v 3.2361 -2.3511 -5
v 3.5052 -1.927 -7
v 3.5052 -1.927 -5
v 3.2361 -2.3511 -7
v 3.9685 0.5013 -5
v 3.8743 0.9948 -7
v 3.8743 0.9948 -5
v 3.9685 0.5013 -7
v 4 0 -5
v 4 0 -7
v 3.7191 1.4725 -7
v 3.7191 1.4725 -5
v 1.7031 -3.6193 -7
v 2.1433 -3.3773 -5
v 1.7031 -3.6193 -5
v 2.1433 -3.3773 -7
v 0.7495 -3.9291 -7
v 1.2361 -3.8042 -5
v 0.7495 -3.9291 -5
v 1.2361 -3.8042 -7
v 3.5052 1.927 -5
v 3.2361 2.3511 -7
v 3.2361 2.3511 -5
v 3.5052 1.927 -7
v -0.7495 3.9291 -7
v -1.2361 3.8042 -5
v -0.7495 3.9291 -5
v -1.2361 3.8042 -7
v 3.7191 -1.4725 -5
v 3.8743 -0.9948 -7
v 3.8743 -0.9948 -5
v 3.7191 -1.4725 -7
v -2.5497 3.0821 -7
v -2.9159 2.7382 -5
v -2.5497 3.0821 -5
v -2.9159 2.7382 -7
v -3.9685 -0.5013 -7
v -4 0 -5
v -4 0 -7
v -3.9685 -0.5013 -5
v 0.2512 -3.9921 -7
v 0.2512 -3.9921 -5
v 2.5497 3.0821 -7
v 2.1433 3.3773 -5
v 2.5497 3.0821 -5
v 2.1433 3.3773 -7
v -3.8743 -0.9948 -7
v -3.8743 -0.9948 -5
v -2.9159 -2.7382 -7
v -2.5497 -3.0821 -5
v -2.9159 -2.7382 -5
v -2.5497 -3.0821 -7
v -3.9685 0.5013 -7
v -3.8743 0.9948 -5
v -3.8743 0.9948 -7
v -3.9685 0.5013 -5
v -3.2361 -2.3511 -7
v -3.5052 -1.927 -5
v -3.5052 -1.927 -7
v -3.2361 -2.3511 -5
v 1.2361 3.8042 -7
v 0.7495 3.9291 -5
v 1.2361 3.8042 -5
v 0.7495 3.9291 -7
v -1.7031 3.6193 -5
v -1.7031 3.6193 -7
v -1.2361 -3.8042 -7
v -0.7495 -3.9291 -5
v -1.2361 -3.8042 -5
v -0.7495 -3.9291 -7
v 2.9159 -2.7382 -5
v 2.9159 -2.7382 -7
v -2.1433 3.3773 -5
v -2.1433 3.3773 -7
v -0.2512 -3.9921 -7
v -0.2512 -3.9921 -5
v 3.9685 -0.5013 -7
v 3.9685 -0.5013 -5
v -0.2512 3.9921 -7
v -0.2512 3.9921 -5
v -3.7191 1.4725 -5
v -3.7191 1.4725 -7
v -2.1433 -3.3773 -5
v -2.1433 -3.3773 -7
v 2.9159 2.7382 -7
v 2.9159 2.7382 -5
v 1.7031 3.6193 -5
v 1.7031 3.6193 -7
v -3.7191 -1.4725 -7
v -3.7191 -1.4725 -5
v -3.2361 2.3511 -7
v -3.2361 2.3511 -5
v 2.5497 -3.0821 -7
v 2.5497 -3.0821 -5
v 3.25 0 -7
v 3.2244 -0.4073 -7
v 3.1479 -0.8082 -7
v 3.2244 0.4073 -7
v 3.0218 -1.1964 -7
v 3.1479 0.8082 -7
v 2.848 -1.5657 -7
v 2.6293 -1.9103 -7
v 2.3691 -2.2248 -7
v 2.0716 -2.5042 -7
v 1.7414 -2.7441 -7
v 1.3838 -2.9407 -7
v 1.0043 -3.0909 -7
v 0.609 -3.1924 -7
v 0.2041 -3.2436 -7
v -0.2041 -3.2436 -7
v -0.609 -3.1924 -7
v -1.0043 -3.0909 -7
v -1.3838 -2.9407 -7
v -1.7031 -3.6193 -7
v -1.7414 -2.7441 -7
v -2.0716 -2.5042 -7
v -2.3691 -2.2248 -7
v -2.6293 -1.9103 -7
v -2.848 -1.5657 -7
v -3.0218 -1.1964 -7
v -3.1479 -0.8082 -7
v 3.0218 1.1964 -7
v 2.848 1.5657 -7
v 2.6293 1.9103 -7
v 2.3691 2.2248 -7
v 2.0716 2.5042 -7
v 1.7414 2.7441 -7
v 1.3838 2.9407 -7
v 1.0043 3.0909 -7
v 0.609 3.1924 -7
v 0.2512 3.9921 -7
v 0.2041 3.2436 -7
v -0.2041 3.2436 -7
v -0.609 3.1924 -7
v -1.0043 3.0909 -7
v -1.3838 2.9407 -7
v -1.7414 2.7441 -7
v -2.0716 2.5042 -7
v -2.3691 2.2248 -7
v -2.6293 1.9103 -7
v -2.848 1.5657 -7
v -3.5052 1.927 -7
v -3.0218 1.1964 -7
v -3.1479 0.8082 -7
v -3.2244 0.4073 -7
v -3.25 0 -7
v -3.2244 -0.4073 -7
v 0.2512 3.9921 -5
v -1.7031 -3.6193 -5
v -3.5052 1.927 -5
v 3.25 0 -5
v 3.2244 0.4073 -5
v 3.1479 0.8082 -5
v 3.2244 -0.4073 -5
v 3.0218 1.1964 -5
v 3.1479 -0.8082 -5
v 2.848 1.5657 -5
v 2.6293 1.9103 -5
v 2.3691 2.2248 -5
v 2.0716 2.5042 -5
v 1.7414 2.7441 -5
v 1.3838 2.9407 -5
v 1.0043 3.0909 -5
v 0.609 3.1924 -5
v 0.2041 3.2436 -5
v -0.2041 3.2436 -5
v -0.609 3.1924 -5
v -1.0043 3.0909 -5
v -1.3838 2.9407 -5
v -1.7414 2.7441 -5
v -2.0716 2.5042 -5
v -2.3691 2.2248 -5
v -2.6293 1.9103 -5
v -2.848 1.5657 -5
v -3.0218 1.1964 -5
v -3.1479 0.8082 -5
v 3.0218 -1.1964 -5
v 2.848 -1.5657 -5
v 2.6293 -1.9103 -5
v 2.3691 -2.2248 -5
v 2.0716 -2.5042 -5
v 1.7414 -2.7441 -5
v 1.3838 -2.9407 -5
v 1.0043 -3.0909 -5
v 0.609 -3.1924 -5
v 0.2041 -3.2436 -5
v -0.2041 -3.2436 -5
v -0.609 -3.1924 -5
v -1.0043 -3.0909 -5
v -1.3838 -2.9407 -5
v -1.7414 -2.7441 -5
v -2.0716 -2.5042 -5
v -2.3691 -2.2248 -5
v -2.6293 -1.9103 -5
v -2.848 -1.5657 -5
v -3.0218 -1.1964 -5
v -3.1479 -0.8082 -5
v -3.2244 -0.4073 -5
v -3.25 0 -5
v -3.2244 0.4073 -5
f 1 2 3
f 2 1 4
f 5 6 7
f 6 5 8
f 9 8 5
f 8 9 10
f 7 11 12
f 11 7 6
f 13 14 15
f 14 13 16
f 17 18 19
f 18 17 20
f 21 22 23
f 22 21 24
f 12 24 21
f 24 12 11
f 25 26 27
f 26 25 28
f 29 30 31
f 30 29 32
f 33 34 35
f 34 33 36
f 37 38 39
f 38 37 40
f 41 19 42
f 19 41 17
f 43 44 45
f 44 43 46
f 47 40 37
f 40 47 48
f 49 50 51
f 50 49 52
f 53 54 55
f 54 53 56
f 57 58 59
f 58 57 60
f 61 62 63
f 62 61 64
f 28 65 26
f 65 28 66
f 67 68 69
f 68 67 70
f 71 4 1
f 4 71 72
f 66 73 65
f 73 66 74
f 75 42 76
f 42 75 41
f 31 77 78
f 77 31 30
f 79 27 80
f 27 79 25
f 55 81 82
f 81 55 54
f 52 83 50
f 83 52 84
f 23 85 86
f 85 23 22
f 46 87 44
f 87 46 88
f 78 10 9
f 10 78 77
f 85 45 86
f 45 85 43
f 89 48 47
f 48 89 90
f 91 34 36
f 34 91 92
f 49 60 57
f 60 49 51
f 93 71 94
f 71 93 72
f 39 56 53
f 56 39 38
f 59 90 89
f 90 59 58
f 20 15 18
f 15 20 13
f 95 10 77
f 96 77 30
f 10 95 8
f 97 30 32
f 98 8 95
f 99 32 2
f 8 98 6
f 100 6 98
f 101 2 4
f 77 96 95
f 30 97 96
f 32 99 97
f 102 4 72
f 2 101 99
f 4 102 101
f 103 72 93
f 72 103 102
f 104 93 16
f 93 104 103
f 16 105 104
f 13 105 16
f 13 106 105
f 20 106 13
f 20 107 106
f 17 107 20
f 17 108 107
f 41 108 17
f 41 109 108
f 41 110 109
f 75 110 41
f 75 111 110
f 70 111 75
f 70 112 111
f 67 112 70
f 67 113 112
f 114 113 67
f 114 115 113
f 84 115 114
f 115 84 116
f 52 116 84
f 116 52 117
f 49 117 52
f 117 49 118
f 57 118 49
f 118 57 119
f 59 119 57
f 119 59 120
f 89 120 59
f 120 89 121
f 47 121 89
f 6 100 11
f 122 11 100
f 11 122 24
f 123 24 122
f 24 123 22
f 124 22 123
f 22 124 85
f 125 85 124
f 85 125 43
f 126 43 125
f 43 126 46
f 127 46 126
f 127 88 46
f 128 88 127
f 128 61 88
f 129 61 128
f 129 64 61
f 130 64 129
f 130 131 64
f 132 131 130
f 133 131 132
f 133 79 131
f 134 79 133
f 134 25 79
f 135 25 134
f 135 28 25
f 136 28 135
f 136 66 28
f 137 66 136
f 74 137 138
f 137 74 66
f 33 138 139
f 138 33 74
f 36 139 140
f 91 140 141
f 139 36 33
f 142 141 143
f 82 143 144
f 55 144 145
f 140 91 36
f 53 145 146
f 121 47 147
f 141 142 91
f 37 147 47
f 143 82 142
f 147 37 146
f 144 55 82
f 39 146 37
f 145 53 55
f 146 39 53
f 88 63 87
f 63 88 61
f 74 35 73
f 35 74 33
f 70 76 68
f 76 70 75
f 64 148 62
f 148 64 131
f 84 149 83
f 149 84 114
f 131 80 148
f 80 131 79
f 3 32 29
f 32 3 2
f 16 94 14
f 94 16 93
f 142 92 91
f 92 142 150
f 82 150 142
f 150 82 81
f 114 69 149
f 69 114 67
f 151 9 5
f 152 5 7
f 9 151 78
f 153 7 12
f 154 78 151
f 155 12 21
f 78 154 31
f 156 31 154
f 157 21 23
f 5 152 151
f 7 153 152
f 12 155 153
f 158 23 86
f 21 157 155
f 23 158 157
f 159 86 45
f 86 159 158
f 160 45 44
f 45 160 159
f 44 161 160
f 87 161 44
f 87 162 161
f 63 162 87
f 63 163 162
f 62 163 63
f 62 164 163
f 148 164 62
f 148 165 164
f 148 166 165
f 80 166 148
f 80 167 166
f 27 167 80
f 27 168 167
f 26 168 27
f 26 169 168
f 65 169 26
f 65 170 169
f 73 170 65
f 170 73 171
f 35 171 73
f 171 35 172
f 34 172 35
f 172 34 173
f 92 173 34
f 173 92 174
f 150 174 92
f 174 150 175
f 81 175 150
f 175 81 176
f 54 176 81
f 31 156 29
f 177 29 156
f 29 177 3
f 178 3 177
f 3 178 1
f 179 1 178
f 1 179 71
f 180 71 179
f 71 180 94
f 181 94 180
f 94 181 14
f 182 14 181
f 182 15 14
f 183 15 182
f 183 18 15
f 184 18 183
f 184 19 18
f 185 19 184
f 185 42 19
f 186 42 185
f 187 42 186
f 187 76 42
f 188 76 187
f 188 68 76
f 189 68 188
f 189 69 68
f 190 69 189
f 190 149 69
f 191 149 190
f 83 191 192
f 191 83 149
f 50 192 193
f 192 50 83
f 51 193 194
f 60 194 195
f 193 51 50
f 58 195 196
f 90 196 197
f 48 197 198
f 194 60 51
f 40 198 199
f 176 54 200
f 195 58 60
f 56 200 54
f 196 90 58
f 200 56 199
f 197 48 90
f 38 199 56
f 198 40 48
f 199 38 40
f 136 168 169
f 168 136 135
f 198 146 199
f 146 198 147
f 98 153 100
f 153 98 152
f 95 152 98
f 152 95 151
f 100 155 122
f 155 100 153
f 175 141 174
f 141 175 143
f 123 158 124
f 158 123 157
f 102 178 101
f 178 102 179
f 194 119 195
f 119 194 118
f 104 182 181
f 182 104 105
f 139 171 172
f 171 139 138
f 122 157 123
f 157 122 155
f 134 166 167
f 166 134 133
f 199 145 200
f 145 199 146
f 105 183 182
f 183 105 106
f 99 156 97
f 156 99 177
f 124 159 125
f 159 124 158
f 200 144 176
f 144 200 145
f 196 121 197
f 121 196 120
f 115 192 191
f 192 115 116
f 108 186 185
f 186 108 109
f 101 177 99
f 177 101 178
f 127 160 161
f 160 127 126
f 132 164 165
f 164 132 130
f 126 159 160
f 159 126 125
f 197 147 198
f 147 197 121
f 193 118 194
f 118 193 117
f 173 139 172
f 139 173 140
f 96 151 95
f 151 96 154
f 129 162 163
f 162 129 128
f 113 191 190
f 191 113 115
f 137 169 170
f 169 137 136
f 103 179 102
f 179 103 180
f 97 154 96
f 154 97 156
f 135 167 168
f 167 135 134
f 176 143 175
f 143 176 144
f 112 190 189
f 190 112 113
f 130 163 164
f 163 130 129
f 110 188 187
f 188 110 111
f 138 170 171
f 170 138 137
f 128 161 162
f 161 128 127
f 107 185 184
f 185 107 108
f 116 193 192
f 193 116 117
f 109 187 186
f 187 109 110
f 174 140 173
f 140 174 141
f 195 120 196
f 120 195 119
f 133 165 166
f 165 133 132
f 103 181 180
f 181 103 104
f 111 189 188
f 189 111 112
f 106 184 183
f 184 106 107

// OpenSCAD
$fn = 50;

difference() {
	union() {
		translate(v = [0, 0, -7.0]) {
			cylinder(h = 7.0, r = 4.0);
		}
		#translate(v = [0, 0, -8.5]) {
			cylinder(h = 8.5, r = 2.875);
		}
	}
	union() {
		translate(v = [0, 0, 0]) {
			rotate(a = [0, 0, 0]) {
				difference() {
					union() {
						translate(v = [0, 0, -5]) {
							linear_extrude(height = 5) {
								polygon(points = [[5.914249999999999, 0.0], [2.957125, 5.1218907443321156], [-2.9571249999999982, 5.1218907443321156], [-5.914249999999999, 7.242867331857232e-16], [-2.9571250000000022, -5.121890744332115], [2.9571249999999956, -5.121890744332118]]);
							}
						}
					}
					union();
				}
			}
		}
		#translate(v = [0, 0, -100.0]) {
			cylinder(h = 200, r = 3.25);
		}
	}
}
